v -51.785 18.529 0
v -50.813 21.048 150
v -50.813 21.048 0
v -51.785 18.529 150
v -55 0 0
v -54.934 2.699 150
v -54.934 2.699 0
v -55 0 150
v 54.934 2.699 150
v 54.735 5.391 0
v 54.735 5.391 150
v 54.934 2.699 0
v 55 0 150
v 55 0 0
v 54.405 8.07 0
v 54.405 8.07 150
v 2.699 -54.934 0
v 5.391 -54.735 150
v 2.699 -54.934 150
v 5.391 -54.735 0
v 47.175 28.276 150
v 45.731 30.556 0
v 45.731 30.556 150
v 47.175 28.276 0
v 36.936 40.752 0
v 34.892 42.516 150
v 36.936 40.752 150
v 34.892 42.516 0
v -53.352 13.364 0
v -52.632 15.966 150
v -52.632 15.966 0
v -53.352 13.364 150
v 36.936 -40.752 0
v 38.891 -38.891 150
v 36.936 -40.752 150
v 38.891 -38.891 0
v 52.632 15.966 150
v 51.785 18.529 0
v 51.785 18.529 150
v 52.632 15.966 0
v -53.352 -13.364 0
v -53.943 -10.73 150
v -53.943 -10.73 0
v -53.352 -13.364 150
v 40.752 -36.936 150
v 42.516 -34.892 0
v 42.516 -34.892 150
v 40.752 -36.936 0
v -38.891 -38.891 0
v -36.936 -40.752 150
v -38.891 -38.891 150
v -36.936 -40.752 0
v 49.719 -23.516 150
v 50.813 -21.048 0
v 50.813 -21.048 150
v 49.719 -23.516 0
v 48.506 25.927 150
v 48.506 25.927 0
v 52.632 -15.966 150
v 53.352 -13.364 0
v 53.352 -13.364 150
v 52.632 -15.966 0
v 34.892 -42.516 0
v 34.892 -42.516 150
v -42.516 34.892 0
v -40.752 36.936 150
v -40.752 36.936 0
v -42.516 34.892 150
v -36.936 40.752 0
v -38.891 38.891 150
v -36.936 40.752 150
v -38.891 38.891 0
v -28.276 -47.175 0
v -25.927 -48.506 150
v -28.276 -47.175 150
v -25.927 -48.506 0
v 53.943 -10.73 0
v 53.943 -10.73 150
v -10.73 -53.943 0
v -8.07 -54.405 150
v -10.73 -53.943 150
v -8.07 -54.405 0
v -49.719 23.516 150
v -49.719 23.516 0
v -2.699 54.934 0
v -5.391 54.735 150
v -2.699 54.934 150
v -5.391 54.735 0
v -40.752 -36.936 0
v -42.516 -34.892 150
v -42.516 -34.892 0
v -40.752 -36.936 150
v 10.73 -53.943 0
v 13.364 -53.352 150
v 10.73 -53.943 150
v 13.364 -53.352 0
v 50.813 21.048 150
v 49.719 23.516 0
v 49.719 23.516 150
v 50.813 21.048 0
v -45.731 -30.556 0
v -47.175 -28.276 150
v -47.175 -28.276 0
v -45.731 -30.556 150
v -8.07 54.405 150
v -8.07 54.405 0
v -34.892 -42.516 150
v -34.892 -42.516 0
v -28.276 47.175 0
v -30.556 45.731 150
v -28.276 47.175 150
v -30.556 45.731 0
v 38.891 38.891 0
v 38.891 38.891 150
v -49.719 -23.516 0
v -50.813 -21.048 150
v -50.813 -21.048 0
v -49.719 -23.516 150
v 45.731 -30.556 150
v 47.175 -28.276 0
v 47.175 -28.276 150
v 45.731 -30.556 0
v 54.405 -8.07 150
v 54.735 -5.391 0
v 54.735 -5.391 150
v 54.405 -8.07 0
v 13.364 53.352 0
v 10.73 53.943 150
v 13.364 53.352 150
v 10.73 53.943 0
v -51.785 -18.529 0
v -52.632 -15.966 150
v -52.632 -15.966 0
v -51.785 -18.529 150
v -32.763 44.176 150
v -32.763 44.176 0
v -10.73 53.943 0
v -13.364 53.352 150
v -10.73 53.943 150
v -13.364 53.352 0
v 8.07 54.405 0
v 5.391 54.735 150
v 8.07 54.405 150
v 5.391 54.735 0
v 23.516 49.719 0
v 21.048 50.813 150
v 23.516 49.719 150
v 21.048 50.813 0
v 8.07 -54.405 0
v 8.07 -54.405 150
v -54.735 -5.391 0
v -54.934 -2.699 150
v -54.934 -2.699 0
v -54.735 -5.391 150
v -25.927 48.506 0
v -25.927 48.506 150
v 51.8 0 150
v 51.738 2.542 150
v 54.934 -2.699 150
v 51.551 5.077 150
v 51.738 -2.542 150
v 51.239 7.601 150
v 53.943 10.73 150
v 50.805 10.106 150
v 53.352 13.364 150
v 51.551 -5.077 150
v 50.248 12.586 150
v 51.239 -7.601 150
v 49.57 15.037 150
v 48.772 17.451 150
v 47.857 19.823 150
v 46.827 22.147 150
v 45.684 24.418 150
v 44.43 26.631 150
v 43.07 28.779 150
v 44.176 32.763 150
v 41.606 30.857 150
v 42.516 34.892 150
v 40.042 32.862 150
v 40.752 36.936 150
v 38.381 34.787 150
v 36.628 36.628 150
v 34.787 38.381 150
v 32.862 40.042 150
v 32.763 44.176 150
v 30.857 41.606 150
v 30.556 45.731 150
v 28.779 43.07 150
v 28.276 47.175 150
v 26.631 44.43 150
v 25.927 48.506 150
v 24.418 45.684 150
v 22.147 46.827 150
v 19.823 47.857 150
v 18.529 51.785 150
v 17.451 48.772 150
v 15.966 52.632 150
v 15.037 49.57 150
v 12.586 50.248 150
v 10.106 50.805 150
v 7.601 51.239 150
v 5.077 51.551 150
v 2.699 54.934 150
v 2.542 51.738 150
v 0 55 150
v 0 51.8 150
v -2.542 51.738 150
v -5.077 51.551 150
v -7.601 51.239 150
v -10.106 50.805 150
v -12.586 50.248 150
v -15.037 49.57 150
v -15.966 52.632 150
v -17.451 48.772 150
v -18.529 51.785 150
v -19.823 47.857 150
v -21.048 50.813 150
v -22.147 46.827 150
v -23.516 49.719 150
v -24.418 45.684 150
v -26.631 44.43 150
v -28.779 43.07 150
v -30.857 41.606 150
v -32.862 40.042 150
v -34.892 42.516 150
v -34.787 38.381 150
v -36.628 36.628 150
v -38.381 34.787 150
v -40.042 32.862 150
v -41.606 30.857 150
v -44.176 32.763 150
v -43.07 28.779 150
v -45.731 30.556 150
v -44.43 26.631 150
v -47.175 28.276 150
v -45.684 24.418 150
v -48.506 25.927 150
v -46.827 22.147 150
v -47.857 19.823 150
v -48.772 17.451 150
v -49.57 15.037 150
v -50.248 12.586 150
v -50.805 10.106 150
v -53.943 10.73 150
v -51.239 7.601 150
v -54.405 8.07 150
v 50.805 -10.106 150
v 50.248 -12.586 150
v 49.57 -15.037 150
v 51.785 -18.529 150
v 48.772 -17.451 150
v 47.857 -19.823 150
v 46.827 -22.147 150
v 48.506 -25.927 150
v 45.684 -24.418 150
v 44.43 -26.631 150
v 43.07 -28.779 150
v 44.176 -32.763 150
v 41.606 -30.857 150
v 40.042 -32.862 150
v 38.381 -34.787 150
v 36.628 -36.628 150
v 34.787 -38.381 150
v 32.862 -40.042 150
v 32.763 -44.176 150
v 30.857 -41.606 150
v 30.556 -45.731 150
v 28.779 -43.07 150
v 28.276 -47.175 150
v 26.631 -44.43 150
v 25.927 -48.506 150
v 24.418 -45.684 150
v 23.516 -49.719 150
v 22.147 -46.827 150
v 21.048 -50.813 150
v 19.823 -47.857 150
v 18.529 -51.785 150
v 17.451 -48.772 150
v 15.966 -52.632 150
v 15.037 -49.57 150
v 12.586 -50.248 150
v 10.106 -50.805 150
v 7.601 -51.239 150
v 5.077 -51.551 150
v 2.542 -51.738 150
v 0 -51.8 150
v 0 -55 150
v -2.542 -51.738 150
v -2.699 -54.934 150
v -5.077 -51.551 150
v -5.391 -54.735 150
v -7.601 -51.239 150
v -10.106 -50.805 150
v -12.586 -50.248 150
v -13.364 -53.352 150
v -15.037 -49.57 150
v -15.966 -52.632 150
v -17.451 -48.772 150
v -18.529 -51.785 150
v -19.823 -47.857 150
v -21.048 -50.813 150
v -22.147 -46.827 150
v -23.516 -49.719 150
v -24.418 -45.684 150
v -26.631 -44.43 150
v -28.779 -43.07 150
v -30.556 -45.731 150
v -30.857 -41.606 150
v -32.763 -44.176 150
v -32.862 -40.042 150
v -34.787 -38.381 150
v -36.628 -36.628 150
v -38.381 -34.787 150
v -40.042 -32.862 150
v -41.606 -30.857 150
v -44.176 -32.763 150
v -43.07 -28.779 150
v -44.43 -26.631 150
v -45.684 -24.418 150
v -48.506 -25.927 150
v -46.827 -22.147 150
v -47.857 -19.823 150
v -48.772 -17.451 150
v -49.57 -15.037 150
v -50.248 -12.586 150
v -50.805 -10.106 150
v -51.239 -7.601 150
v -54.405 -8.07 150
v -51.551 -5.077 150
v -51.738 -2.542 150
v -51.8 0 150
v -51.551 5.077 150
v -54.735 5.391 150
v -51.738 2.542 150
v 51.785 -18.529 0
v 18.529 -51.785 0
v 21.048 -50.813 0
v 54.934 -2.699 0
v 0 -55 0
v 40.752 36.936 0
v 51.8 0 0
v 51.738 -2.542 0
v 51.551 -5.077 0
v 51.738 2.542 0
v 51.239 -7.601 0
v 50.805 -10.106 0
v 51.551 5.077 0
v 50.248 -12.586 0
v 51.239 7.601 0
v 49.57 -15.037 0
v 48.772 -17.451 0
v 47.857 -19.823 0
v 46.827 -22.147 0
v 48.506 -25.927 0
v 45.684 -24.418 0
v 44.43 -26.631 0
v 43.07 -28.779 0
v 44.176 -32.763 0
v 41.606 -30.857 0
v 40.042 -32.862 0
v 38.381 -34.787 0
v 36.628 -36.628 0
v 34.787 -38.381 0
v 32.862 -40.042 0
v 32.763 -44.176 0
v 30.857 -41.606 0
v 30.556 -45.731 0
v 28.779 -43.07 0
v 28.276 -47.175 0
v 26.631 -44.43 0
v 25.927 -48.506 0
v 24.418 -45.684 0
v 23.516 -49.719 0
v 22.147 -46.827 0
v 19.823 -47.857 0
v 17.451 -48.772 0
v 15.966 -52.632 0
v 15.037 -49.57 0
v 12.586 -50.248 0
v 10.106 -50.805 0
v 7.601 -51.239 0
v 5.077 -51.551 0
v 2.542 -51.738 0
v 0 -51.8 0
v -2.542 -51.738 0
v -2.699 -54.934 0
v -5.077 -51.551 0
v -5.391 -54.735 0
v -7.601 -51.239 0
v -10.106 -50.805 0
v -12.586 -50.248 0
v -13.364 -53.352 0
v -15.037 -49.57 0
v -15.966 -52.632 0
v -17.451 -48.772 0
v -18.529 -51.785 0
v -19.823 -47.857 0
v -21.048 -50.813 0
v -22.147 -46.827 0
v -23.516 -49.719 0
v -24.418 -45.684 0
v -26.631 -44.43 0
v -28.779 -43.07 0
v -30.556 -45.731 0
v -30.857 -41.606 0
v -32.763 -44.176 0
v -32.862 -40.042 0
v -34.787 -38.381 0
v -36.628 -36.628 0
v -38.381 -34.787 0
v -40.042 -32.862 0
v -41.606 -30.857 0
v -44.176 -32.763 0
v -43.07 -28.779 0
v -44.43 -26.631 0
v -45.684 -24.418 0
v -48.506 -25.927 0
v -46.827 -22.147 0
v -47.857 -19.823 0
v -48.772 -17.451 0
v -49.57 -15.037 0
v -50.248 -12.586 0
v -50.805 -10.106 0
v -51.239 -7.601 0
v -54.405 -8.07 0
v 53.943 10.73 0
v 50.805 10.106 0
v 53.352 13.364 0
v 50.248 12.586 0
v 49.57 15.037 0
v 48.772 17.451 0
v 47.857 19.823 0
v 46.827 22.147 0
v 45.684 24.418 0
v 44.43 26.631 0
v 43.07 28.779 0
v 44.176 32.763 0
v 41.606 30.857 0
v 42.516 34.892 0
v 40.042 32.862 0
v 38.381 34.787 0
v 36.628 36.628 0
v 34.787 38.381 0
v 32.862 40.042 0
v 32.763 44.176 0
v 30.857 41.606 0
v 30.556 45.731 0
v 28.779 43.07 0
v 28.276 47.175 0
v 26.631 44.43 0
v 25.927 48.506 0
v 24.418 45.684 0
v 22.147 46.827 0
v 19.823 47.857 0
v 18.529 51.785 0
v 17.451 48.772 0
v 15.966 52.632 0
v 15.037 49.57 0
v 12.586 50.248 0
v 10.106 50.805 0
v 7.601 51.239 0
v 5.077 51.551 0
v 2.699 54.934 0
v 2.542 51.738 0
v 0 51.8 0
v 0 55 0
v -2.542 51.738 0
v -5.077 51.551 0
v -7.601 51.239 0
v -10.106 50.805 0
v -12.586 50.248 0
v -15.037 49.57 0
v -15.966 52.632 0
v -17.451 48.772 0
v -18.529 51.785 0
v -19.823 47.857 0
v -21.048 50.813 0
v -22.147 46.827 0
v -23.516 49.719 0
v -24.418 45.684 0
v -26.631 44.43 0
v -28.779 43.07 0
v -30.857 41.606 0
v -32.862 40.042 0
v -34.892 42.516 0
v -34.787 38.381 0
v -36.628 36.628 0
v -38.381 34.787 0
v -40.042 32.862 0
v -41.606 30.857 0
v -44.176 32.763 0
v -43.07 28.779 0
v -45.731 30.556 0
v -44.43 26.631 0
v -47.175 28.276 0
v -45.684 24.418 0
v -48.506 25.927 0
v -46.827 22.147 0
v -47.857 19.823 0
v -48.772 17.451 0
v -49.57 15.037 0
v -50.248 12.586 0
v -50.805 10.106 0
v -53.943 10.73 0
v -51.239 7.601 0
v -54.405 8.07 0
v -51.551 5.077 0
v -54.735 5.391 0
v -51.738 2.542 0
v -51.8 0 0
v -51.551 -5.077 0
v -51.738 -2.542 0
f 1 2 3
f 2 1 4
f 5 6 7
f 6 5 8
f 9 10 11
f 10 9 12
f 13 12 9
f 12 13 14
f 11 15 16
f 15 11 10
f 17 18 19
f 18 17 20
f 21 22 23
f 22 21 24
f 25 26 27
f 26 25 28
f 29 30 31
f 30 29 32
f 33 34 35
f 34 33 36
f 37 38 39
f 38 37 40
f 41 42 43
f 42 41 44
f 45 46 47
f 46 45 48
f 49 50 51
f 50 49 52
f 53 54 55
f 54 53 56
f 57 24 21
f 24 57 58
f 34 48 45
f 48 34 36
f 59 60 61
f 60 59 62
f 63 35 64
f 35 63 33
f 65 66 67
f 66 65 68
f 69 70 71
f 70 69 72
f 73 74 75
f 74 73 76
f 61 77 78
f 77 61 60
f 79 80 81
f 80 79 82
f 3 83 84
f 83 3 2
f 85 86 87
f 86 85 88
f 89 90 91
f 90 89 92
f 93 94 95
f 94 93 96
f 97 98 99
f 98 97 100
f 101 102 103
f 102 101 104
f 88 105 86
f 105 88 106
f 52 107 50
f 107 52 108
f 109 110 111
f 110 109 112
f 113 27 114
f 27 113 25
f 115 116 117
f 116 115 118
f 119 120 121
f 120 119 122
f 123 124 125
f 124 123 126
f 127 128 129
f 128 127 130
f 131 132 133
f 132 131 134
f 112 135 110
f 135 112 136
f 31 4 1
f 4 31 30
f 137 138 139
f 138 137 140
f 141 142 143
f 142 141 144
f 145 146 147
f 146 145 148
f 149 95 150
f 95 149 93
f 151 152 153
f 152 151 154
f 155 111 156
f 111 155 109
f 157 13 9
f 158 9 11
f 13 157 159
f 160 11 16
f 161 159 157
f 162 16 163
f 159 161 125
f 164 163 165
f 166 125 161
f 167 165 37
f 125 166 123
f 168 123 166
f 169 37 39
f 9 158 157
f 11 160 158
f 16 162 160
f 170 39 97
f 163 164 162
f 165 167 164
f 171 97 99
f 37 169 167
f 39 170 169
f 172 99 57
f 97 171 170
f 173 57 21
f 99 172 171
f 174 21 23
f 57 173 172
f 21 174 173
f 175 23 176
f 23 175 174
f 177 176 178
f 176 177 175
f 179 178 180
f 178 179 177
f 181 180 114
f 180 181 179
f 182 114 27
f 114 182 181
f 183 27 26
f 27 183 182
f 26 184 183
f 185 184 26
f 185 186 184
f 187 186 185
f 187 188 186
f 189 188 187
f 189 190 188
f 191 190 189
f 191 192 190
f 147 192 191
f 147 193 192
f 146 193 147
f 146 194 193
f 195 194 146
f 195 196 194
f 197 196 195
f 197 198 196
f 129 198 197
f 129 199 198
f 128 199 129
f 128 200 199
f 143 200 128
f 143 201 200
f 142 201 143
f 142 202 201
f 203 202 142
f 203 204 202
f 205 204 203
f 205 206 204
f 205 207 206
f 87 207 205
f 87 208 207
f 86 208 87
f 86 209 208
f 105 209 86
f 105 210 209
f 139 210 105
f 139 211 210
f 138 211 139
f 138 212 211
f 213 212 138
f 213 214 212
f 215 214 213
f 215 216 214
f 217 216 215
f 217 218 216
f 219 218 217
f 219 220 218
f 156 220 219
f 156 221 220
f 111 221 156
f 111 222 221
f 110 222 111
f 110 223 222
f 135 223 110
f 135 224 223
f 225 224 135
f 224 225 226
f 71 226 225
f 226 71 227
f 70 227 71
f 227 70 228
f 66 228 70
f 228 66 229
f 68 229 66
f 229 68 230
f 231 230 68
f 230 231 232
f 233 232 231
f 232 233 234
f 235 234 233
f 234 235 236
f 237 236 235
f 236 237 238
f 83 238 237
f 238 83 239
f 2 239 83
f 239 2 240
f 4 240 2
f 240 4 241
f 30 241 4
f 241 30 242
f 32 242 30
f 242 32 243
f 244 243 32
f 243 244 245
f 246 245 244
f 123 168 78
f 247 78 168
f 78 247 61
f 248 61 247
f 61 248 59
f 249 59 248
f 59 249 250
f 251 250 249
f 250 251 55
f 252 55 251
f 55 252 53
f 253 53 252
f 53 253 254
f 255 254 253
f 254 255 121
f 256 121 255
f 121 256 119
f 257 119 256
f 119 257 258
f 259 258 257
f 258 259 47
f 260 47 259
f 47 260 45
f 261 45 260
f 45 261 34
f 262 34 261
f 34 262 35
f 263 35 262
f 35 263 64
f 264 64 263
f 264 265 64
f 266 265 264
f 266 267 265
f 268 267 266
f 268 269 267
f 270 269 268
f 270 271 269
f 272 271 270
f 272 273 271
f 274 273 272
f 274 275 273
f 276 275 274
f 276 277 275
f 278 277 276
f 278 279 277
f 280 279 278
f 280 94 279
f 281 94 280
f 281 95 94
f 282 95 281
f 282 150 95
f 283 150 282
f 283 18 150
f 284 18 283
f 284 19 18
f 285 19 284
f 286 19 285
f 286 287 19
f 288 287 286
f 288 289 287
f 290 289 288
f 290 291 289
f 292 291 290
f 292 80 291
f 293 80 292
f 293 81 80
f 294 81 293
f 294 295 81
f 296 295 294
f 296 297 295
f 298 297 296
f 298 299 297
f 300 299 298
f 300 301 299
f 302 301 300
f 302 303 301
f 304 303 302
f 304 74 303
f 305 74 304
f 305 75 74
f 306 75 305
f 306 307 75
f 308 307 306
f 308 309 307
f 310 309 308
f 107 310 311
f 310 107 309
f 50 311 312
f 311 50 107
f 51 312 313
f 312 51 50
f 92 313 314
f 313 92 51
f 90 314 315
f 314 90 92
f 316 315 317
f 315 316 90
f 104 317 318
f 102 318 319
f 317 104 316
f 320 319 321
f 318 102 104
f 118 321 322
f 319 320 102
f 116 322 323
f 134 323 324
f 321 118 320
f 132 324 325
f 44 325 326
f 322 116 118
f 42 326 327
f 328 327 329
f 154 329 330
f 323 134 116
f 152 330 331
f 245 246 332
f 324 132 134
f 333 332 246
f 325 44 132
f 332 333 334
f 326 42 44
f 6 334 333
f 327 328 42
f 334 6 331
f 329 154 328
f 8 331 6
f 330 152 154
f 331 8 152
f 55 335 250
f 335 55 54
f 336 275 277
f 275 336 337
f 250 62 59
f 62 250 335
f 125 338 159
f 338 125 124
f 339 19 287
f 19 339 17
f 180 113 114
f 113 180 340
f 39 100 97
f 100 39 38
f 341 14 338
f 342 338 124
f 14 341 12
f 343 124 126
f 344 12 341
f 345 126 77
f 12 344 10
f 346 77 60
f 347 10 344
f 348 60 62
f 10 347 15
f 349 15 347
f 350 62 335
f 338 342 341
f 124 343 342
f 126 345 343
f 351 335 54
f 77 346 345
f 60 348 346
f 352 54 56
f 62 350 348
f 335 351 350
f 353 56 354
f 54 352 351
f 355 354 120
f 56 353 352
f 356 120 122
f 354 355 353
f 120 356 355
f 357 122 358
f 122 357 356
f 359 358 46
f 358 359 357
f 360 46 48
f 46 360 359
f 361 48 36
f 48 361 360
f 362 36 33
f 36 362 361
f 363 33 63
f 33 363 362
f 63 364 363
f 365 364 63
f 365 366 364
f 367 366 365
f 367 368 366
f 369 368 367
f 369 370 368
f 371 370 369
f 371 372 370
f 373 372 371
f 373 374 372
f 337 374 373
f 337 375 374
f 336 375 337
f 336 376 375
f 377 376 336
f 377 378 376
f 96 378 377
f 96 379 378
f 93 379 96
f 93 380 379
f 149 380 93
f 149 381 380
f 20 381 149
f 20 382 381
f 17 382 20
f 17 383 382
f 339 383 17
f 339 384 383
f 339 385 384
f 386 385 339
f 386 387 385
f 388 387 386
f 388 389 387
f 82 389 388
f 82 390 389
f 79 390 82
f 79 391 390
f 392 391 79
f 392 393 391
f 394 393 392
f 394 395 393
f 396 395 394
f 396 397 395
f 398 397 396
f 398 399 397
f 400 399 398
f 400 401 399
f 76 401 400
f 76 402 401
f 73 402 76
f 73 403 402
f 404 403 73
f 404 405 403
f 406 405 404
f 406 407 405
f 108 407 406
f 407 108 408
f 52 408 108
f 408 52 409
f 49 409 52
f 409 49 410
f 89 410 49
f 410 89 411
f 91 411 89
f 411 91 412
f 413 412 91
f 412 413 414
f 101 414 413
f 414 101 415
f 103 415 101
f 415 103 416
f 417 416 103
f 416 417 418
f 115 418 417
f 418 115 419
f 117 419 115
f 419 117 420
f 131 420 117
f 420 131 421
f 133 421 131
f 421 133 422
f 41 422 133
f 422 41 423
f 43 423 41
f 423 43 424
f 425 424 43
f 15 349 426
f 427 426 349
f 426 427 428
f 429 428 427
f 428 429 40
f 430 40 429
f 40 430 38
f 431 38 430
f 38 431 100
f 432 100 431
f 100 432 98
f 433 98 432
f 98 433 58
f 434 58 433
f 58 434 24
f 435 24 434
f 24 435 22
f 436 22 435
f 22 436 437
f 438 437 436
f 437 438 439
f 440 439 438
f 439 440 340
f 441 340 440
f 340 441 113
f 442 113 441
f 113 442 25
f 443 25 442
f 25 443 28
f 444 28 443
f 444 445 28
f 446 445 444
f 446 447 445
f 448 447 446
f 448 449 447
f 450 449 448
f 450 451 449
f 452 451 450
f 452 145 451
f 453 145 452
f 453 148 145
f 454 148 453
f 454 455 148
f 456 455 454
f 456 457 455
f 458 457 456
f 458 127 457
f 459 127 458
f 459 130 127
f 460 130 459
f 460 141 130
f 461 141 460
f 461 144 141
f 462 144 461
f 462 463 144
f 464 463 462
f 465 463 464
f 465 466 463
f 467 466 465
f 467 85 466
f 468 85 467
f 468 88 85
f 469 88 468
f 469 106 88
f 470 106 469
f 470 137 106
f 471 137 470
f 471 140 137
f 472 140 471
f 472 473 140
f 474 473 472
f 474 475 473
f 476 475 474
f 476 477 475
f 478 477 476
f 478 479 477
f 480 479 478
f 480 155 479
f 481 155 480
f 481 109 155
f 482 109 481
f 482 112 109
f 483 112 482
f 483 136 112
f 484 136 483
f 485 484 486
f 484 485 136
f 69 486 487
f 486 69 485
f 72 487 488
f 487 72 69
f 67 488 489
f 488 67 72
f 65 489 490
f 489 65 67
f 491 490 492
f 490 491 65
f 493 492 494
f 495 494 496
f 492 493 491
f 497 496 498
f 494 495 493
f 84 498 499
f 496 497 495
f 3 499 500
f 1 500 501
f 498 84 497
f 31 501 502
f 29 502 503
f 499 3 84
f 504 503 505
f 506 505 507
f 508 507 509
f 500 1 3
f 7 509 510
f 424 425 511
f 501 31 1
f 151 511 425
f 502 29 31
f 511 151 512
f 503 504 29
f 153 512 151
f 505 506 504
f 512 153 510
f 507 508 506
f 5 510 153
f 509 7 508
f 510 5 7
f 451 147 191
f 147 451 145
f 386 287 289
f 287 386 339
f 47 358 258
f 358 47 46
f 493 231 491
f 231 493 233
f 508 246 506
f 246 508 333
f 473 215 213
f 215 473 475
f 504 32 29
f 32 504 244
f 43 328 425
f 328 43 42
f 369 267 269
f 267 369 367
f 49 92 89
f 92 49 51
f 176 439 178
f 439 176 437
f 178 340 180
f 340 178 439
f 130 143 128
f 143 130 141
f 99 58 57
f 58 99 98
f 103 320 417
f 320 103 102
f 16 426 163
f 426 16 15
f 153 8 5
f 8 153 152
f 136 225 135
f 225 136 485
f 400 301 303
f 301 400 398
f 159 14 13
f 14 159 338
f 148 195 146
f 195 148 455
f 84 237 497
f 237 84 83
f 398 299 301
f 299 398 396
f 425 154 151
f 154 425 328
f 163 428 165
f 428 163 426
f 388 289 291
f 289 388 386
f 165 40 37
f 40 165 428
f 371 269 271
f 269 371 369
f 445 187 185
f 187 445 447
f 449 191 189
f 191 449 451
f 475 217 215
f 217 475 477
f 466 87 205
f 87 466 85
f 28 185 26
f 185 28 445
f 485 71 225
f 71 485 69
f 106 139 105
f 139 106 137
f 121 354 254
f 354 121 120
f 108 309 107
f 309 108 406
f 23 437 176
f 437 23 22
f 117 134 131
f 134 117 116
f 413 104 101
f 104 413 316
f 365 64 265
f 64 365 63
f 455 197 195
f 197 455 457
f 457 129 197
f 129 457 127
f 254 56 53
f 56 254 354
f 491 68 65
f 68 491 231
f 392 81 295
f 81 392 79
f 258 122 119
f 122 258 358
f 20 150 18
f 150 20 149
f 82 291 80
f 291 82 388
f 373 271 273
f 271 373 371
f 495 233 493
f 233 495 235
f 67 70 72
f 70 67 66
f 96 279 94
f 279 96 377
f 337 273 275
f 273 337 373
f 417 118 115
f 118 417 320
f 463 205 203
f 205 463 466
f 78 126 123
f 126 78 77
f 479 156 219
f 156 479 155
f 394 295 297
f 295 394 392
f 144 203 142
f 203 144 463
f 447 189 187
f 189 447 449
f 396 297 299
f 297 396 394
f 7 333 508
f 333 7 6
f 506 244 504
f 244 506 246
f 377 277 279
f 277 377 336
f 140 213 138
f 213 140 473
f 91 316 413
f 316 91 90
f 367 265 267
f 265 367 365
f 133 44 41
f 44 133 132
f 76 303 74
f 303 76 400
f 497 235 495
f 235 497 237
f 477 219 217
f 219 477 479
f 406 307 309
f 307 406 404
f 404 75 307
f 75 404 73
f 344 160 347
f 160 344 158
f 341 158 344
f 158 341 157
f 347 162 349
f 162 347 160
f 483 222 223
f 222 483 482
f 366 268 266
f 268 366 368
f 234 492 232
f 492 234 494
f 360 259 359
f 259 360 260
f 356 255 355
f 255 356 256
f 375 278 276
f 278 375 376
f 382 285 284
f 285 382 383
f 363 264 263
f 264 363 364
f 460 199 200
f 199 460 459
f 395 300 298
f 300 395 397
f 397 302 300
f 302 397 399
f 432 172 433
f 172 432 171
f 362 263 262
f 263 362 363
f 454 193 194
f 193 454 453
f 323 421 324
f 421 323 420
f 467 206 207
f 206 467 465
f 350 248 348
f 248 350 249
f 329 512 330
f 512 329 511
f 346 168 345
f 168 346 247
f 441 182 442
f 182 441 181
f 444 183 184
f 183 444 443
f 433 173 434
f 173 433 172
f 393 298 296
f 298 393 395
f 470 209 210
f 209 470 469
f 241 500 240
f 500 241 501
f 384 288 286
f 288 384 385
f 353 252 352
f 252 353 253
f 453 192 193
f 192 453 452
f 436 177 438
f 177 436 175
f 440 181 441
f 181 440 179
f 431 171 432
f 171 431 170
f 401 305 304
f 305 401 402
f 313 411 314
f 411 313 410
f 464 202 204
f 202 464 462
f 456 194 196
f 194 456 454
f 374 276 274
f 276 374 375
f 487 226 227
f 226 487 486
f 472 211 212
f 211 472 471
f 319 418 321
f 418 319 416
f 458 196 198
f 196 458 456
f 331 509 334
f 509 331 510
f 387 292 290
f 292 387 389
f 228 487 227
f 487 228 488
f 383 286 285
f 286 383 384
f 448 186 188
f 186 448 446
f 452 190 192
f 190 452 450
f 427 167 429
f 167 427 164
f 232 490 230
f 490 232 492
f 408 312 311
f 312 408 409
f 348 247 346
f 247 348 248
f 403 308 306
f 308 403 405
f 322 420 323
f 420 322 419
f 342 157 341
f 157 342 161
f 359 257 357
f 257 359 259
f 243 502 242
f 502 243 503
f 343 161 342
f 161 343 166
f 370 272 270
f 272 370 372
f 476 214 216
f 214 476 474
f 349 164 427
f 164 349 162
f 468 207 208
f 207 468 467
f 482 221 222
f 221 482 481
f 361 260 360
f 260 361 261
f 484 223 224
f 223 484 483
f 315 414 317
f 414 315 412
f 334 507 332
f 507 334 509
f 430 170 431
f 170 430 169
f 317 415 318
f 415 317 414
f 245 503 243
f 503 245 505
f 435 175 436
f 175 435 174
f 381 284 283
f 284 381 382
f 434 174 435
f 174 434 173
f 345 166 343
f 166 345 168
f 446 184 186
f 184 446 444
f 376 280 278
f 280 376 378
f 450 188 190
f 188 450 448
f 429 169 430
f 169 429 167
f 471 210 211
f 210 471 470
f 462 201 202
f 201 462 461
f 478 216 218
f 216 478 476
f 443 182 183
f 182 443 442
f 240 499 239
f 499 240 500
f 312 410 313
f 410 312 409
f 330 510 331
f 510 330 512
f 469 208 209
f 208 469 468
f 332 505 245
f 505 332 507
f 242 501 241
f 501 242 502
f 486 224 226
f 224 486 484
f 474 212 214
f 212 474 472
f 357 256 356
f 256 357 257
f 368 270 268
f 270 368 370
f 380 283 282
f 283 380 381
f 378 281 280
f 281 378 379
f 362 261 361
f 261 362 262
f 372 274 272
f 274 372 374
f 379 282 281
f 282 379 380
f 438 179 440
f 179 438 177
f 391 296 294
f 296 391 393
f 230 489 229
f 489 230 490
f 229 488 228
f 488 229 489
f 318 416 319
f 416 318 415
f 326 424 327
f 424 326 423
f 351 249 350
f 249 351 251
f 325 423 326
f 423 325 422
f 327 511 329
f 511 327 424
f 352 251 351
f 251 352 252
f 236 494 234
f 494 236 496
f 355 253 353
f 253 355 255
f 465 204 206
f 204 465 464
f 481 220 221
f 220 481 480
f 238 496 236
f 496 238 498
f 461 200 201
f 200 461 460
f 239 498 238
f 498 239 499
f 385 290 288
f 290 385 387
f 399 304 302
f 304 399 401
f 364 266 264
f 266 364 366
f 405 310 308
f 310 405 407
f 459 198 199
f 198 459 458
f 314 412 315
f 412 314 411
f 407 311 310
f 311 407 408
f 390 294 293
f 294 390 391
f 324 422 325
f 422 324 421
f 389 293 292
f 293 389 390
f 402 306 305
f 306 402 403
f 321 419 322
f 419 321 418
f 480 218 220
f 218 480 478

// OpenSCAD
$fn = 128;

// HT 110 pipe (approx.): OD 110 mm, wall 3.2 mm, length 150 mm
od = 110;
wall = 3.2;
id = od - 2*wall;
len = 150;

difference() {
  cylinder(h = len, d = od);
  translate([0,0,-0.1])
    cylinder(h = len + 0.2, d = id);
}
